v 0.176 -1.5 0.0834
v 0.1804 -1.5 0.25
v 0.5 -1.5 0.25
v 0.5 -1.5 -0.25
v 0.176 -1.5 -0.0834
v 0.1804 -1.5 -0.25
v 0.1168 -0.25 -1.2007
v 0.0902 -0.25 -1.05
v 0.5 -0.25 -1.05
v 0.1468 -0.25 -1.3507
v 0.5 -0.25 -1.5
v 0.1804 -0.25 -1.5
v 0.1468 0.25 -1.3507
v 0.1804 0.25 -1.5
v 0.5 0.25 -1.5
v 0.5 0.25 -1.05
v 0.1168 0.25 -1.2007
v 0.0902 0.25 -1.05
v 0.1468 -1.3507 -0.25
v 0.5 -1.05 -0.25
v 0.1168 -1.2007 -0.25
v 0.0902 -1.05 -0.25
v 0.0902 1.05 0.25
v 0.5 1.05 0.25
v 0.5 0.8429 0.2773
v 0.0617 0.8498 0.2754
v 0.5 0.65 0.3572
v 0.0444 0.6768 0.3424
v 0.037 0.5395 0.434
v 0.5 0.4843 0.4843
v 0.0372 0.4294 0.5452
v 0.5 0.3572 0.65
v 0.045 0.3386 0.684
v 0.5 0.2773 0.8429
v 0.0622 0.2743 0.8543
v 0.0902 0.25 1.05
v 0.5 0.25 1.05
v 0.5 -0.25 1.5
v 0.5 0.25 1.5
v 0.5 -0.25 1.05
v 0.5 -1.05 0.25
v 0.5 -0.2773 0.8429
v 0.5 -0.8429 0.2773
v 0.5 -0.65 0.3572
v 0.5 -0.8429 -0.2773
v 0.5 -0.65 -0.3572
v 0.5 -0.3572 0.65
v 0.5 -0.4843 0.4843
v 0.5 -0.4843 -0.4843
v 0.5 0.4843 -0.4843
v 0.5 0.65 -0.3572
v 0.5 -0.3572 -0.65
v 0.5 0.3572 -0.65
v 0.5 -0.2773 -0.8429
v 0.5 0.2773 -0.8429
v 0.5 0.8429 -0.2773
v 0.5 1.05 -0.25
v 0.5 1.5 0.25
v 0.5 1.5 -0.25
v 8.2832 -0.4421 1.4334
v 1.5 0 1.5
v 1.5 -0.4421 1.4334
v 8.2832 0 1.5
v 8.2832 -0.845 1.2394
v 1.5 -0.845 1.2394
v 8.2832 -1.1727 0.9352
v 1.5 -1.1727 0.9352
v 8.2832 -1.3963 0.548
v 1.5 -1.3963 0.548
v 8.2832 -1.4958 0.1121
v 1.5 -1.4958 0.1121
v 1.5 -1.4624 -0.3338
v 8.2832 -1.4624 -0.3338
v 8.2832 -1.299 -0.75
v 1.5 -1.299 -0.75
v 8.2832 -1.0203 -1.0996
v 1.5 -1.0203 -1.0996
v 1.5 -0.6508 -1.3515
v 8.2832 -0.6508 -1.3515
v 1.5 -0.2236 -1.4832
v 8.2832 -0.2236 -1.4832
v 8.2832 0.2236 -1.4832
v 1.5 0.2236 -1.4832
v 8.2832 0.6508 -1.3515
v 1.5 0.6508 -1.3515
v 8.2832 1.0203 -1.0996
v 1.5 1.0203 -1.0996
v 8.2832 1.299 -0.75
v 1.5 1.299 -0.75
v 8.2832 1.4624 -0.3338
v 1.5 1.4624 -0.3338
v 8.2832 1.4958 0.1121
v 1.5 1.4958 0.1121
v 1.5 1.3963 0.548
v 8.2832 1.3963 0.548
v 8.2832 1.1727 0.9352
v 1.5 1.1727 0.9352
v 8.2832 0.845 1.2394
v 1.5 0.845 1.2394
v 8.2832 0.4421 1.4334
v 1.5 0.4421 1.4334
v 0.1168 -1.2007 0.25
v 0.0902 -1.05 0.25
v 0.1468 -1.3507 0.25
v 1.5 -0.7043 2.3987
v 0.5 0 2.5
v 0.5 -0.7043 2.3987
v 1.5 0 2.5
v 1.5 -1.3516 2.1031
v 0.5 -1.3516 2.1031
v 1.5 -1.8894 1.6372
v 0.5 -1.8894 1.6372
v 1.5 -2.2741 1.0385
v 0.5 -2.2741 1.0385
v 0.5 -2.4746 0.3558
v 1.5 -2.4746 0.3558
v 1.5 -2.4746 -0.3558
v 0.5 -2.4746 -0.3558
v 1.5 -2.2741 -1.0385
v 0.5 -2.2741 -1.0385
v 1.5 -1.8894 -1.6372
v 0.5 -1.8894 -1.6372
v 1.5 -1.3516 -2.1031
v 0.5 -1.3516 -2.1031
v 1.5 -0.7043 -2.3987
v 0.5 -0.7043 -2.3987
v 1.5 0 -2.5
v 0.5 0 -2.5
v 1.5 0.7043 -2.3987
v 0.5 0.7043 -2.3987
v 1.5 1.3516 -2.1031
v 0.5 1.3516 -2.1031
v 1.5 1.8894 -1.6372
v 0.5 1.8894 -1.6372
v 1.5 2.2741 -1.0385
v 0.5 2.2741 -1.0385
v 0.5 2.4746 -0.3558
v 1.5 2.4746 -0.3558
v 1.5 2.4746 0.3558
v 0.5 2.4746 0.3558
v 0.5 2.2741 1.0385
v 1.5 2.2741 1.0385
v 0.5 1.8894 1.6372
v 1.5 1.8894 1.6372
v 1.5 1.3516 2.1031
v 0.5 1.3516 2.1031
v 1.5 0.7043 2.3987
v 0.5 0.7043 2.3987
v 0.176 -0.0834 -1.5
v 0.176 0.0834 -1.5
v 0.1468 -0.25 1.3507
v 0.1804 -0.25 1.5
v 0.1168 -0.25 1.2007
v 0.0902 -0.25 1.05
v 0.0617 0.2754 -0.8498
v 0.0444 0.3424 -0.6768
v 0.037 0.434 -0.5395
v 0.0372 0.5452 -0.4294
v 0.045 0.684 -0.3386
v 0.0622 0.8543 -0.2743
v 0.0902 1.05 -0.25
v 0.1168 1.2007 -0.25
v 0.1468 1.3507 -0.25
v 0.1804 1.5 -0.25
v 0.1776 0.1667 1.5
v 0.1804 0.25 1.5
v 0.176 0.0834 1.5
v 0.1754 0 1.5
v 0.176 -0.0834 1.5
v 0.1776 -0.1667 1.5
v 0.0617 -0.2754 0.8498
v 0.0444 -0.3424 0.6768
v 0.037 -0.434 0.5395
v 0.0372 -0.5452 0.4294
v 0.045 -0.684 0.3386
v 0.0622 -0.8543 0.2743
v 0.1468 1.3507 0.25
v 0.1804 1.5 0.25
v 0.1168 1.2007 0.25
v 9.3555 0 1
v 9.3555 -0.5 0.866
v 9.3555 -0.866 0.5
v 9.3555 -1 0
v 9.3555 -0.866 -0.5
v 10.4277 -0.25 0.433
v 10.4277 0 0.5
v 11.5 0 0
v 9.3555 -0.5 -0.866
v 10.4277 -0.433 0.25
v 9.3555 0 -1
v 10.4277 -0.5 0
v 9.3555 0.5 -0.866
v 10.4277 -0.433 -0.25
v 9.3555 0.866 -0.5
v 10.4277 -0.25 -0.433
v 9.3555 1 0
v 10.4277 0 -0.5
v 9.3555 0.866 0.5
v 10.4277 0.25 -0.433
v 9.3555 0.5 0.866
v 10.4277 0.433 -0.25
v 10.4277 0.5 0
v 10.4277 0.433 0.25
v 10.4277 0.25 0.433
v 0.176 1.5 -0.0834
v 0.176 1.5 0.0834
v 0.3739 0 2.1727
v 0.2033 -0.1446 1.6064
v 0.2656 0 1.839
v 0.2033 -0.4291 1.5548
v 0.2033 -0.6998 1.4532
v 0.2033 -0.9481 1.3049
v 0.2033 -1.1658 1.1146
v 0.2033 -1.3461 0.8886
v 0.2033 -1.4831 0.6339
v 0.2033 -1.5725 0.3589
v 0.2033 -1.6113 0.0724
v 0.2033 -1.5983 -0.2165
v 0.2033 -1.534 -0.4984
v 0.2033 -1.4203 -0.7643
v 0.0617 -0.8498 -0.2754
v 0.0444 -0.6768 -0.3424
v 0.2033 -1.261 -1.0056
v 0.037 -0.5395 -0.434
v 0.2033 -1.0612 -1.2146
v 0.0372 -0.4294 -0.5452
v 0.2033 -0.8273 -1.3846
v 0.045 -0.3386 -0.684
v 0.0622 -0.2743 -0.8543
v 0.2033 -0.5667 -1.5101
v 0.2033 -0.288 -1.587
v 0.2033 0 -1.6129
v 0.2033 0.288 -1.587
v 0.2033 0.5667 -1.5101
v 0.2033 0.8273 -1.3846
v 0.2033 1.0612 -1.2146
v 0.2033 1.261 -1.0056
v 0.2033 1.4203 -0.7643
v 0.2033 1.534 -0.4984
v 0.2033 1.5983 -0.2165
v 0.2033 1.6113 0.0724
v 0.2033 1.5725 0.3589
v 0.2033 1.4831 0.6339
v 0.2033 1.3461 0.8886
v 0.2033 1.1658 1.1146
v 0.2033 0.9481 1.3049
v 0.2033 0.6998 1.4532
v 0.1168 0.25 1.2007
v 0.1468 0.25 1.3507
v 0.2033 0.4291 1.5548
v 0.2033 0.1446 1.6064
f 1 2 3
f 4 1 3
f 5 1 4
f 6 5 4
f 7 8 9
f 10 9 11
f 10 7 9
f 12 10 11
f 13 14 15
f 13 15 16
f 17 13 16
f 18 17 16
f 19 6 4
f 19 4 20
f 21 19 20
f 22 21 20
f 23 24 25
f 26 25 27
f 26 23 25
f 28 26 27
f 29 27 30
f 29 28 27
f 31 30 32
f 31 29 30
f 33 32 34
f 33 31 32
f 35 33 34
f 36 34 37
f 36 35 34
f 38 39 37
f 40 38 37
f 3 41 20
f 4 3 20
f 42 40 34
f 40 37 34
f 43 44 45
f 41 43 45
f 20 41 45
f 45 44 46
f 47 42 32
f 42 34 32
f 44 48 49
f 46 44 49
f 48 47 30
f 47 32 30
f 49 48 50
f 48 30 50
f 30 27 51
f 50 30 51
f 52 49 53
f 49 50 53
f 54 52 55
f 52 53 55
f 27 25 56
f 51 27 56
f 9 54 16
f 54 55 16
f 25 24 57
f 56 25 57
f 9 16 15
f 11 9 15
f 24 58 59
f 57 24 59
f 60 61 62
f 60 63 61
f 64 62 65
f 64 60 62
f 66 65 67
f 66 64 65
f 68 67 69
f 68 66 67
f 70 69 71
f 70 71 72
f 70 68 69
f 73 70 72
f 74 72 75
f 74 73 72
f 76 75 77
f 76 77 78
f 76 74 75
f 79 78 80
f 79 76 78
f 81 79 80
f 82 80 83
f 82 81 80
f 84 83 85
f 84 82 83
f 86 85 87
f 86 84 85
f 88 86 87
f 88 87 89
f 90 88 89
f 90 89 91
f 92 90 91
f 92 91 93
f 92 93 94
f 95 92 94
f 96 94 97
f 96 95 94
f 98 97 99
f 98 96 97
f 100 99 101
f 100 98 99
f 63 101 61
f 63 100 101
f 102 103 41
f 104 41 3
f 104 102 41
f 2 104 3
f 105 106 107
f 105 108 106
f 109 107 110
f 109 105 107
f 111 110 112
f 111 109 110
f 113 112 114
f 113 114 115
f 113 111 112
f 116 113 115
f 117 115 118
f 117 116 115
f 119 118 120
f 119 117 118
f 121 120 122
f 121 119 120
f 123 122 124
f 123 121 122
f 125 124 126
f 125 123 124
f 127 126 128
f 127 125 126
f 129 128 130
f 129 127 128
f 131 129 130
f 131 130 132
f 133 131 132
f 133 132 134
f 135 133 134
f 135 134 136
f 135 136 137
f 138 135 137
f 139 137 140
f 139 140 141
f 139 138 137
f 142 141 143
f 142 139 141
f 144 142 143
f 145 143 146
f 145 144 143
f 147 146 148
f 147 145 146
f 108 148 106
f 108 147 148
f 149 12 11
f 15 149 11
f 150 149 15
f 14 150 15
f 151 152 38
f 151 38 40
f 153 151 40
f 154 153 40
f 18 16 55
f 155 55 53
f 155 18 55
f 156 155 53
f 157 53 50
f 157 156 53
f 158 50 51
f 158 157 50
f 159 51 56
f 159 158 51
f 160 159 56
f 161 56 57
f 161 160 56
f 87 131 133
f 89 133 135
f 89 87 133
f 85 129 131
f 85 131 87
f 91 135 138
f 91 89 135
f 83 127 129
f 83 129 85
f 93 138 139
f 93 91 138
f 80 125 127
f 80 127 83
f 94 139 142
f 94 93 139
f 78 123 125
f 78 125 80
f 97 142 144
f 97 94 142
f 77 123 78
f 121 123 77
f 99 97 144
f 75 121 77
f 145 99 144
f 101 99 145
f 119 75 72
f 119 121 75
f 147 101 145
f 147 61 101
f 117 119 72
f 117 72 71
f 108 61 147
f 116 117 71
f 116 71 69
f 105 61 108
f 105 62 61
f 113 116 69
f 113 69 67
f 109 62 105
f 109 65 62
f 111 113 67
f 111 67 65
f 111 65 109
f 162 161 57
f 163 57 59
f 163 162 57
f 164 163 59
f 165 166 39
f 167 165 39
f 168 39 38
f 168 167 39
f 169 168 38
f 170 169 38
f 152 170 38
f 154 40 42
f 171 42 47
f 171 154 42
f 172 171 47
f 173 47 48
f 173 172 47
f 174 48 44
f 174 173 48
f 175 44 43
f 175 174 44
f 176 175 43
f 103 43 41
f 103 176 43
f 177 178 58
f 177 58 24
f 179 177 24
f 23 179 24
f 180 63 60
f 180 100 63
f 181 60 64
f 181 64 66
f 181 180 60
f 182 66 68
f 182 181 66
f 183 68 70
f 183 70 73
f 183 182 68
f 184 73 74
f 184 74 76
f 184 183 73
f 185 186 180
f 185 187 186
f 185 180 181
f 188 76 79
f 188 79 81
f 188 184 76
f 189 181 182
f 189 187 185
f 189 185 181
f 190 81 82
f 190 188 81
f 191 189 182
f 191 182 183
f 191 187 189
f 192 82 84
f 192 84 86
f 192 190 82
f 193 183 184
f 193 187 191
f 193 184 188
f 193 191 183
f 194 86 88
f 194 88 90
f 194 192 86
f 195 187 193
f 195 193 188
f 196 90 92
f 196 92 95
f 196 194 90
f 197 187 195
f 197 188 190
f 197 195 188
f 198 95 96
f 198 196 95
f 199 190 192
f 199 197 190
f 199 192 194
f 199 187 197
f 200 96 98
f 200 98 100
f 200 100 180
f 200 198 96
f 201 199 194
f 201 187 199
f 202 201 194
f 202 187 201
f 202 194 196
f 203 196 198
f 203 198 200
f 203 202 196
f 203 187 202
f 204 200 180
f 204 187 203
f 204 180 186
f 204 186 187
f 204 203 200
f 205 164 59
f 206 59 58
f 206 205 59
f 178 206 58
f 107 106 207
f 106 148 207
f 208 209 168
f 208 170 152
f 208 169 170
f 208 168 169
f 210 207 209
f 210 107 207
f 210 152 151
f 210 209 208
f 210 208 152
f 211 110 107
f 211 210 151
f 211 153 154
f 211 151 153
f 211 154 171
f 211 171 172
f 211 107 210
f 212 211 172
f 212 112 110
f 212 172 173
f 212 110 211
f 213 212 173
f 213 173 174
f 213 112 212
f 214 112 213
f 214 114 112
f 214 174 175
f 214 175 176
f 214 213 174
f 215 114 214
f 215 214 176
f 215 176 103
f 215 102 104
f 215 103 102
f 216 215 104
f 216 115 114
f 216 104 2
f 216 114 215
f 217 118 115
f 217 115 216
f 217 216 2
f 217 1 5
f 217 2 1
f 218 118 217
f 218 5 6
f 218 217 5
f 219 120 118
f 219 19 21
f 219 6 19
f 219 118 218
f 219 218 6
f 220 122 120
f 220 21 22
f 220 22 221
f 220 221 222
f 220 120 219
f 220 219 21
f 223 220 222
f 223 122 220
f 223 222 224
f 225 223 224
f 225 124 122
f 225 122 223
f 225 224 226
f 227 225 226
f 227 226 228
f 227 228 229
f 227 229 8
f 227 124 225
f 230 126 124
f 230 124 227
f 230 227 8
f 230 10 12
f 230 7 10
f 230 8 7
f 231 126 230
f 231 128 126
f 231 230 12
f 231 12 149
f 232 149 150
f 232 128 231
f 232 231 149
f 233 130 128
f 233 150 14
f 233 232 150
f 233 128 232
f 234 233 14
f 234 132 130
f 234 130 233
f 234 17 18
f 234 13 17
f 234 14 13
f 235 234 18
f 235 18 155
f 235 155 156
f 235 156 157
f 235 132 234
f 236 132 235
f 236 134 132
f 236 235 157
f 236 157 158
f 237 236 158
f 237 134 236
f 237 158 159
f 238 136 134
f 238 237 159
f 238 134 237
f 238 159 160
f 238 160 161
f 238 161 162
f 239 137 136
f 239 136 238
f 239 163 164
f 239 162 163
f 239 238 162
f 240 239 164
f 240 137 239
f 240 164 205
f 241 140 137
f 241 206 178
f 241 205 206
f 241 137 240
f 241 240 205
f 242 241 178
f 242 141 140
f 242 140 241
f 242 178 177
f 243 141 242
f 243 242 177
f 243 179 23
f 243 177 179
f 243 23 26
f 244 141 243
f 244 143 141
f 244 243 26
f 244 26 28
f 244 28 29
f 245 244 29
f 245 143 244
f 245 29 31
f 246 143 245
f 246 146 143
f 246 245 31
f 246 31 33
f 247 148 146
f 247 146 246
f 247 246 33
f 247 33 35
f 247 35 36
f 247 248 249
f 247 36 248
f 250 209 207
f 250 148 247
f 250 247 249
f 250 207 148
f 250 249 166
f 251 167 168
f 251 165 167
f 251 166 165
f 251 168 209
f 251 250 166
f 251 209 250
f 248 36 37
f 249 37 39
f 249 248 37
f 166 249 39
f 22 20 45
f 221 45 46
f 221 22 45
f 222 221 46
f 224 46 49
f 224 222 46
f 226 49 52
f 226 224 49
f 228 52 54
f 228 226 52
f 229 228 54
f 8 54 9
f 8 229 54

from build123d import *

# Parameters (mm, degrees)
CUT_EXTRUDE_1_DEPTH = 0.5


with BuildPart() as part:
    # 草图1 → 旋转1 (revolve)
    with BuildSketch(Plane.XY, mode=Mode.PRIVATE) as revolve_1_sk:
        with BuildLine():
            Line((1.5, 2.5), (1.5, 1.5))
            Line((1.5, 1.5), (8.283239619, 1.5))
            Line((8.283239619, 1.5), (11.5, 0))
            Line((11.5, 0), (0, 0))
            ThreePointArc((0, 0), (0.126225608, 1.274754878), (0.5, 2.5))
            Line((0.5, 2.5), (1.5, 2.5))
        make_face()
    revolve(revolve_1_sk.sketch.rotate(Axis((-93.852509653, 0, 0), (1, 0, 0)), 90), axis=Axis((-93.852509653, 0, 0), (1, 0, 0)))

    # 草图2 → 切除-拉伸1 (cut)
    with BuildSketch(Plane(origin=(0, 0, 0), x_dir=(0, 0, -1), z_dir=(1, 0, 0))):
        with BuildLine():
            Line((1.5, 0.25), (1.05, 0.25))
            ThreePointArc((1.05, 0.25), (0.484314575, 0.484314575), (0.25, 1.05))
            Line((0.25, 1.05), (0.25, 1.5))
            Line((0.25, 1.5), (-0.25, 1.5))
            Line((-0.25, 1.5), (-0.25, 1.05))
            ThreePointArc((-0.25, 1.05), (-0.484314575, 0.484314575), (-1.05, 0.25))
            Line((-1.05, 0.25), (-1.5, 0.25))
            Line((-1.5, 0.25), (-1.5, -0.25))
            Line((-1.5, -0.25), (-1.05, -0.25))
            ThreePointArc((-1.05, -0.25), (-0.484314575, -0.484314575), (-0.25, -1.05))
            Line((-0.25, -1.05), (-0.25, -1.5))
            Line((-0.25, -1.5), (0.25, -1.5))
            Line((0.25, -1.5), (0.25, -1.05))
            ThreePointArc((0.25, -1.05), (0.484314575, -0.484314575), (1.05, -0.25))
            Line((1.05, -0.25), (1.5, -0.25))
            Line((1.5, -0.25), (1.5, 0.25))
        make_face()
    extrude(amount=CUT_EXTRUDE_1_DEPTH, mode=Mode.SUBTRACT)


solid = part.part
